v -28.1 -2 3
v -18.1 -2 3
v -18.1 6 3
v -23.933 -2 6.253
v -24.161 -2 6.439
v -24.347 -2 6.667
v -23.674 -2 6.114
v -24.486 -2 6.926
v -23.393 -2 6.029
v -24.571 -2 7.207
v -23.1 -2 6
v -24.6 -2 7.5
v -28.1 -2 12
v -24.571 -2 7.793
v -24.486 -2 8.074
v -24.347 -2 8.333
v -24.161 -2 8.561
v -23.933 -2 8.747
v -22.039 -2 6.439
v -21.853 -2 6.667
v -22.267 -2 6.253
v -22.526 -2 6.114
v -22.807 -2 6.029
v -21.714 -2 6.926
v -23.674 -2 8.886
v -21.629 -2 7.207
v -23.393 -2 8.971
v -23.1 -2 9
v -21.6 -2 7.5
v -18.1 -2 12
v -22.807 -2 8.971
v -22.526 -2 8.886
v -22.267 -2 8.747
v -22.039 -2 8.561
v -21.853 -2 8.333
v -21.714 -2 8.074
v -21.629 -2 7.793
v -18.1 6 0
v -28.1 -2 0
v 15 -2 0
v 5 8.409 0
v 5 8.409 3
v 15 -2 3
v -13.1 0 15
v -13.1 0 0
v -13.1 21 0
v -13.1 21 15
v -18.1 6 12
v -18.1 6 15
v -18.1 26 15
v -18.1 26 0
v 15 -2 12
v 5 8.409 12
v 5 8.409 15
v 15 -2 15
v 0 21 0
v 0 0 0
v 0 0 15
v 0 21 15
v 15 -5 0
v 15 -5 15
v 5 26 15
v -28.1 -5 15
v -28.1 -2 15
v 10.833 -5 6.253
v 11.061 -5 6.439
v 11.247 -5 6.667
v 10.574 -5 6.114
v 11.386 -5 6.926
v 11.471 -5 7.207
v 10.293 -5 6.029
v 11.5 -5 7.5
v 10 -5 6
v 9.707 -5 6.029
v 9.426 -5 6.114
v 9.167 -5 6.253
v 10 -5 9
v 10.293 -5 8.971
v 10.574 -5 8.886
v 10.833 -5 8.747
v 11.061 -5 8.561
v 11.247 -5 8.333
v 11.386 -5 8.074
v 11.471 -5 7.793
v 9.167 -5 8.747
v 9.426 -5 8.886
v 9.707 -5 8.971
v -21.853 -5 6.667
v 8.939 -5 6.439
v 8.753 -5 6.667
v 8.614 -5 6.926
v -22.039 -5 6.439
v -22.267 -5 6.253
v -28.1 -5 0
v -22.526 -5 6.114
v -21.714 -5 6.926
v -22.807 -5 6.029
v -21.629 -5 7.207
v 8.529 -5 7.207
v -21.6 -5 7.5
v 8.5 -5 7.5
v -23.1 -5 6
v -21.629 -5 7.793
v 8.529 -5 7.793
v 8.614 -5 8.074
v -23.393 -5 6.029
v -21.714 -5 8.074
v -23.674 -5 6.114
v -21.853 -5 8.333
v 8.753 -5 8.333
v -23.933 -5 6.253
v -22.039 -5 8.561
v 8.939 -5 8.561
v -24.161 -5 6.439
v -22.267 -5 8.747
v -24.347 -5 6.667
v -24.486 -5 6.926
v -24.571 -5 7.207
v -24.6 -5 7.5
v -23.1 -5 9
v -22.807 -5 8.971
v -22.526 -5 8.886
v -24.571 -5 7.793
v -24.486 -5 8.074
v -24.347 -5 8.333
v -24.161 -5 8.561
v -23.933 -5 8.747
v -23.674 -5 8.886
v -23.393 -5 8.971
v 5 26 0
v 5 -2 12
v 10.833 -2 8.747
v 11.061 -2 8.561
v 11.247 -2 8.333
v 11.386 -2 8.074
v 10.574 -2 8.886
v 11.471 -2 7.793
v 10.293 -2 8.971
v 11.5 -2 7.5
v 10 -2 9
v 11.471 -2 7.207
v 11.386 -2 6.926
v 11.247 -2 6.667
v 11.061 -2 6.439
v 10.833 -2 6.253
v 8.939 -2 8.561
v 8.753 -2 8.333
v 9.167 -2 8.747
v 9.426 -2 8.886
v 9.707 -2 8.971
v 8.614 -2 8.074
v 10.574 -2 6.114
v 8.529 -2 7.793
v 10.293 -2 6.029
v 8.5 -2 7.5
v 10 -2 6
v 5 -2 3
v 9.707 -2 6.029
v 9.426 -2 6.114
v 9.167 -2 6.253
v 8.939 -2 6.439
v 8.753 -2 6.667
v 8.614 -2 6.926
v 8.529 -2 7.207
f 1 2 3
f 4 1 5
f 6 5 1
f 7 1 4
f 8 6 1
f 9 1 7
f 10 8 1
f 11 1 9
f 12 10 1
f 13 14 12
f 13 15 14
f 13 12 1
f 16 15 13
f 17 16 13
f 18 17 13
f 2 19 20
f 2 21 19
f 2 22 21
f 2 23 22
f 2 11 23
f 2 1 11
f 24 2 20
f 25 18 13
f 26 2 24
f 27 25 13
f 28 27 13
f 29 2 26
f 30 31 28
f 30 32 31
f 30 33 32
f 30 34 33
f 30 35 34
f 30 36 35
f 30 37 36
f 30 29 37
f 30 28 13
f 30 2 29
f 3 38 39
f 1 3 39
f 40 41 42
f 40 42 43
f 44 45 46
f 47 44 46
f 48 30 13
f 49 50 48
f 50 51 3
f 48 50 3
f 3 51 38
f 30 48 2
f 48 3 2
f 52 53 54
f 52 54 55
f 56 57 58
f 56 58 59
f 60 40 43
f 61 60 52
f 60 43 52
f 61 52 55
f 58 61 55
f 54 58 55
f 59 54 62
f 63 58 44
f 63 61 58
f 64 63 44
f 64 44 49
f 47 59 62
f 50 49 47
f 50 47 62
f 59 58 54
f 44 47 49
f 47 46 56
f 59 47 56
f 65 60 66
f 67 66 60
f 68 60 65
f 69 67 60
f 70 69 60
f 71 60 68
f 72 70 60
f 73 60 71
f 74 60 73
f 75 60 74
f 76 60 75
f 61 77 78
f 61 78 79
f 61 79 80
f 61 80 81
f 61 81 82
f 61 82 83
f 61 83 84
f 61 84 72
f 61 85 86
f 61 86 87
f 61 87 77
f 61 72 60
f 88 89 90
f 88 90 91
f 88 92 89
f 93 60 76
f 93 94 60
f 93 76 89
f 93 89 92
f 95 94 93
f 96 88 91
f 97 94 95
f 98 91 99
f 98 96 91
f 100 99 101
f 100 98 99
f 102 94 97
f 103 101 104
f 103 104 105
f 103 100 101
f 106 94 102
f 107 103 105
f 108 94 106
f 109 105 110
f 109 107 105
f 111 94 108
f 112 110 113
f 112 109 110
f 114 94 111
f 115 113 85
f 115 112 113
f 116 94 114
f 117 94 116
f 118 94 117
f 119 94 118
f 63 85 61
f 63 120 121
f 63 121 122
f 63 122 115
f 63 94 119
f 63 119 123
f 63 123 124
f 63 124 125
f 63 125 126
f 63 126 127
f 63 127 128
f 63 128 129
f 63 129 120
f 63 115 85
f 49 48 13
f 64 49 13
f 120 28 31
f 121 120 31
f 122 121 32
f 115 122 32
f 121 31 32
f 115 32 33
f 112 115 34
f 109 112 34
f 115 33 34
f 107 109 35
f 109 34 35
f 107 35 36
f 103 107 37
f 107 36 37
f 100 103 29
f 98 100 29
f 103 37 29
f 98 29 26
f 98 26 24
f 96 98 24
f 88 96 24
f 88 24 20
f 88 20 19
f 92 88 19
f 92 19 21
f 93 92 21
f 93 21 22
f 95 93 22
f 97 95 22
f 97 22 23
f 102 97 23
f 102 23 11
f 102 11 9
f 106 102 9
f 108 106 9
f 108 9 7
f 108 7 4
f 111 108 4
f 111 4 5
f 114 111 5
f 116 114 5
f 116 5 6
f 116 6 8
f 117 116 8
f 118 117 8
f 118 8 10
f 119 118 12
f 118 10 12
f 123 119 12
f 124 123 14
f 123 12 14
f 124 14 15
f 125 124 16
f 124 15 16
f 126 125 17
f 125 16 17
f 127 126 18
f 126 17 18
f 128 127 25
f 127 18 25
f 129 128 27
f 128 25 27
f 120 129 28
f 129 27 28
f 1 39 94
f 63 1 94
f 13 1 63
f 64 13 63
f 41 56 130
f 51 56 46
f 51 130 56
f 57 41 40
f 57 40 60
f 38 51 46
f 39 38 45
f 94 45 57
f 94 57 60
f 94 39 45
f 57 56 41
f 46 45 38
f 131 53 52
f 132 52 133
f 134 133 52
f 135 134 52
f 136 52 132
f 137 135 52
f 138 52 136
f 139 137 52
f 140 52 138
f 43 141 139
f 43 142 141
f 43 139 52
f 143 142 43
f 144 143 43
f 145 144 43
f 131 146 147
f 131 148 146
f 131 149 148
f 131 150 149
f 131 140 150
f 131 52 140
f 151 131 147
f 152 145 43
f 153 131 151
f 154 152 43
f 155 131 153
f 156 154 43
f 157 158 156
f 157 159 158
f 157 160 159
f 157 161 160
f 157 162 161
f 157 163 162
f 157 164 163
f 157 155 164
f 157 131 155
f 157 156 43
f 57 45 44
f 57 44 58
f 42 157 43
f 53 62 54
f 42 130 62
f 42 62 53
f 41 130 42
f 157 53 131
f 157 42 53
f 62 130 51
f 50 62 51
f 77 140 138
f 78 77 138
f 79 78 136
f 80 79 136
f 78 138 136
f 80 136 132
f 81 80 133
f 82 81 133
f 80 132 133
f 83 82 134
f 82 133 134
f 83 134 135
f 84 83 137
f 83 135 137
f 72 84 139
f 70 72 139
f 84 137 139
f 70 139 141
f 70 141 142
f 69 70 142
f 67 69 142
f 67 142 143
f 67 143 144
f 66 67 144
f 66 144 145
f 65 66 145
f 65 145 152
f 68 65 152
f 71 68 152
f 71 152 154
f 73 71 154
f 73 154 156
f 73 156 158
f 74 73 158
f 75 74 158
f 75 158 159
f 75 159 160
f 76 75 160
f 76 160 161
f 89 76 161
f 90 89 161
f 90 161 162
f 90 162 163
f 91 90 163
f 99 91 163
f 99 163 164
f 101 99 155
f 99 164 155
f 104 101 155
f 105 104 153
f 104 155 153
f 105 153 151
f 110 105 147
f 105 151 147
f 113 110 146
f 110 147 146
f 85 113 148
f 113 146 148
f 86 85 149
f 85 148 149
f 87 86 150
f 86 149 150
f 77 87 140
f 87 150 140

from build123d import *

# Parameters (mm, degrees)
ESBO_O1_W                = 13.1
ESBO_O1_H                = 21
RESSALTO_EXTRUS_O1_DEPTH = 15
ESBO_O2_W                = 15
ESBO_O2_H                = 3
RESSALTO_EXTRUS_O2_DEPTH = 10
ESBO_O3_W                = 3
ESBO_O3_H                = 8
RESSALTO_EXTRUS_O3_DEPTH = 10
CORTE_EXTRUS_O1_DEPTH    = 19
ESBO_O5_R                = 1.5
CORTE_EXTRUS_O2_DEPTH    = 19
RESSALTO_EXTRUS_O4_DEPTH = 10
CORTE_EXTRUS_O3_DEPTH    = 23
ESBO_O8_R                = 1.5
CORTE_EXTRUS_O4_DEPTH    = 23


with BuildPart() as part:
    # Esboço1 → Ressalto-extrusão1 (new body)
    with BuildSketch(Plane.XY):
        Polygon((0, 26), (5, 26), (5, -5), (-18.1, -5), (-18.1, 0), (-18.1, 26), align=None)
        with Locations((-6.55, 10.5)):
            Rectangle(ESBO_O1_W, ESBO_O1_H, mode=Mode.SUBTRACT)
    extrude(amount=RESSALTO_EXTRUS_O1_DEPTH)

    # Esboço2 → Ressalto-extrusão2 (add)
    with BuildSketch(Plane.ZY.offset(18.1)):
        with Locations((7.5, -3.5)):
            Rectangle(ESBO_O2_W, ESBO_O2_H)
    extrude(amount=RESSALTO_EXTRUS_O2_DEPTH)

    # Esboço3 → Ressalto-extrusão3 (add)
    with BuildSketch(Plane.ZY.offset(18.1)):
        with Locations((1.5, 2)):
            Rectangle(ESBO_O3_W, ESBO_O3_H)
        with Locations((13.5, 2)):
            Rectangle(ESBO_O3_W, ESBO_O3_H)
    extrude(amount=RESSALTO_EXTRUS_O3_DEPTH)

    # Esboço4 → Corte-extrusão1 (cut)
    with BuildSketch(Plane(origin=(0, 0, 0), x_dir=(-1, 0, 0), z_dir=(0, 0, -1))):
        Polygon((18.1, 6), (28.1, -2), (28.1, 6), align=None)
    extrude(amount=-CORTE_EXTRUS_O1_DEPTH, mode=Mode.SUBTRACT)

    # Esboço5 → Corte-extrusão2 (cut)
    with BuildSketch(Plane(origin=(0, -2, 0), x_dir=(1, 0, 0), z_dir=(0, 1, 0))):
        with Locations(Location((-23.1, -7.5, 0), (0, 0, 270))):
            Circle(ESBO_O5_R)
    extrude(amount=-CORTE_EXTRUS_O2_DEPTH, mode=Mode.SUBTRACT)

    # Esboço6 → Ressalto-extrusão4 (add)
    with BuildSketch(Plane(origin=(5, 0, 0), x_dir=(0, 0, -1), z_dir=(1, 0, 0))):
        Polygon((-15, -5), (-15, 8.409277905), (-12, 8.409277905), (-12, -2), (-3, -2), (-3, 8.409277905), (0, 8.409277905), (0, -5), align=None)
    extrude(amount=RESSALTO_EXTRUS_O4_DEPTH)

    # Esboço7 → Corte-extrusão3 (cut)
    with BuildSketch(Plane(origin=(0, 0, 0), x_dir=(-1, 0, 0), z_dir=(0, 0, -1))):
        Polygon((-5, 8.409277905), (-15, -2), (-15, 8.409277905), align=None)
    extrude(amount=-CORTE_EXTRUS_O3_DEPTH, mode=Mode.SUBTRACT)

    # Esboço8 → Corte-extrusão4 (cut)
    with BuildSketch(Plane(origin=(0, -2, 0), x_dir=(1, 0, 0), z_dir=(0, 1, 0))):
        with Locations(Location((10, -7.5, 0), (0, 0, 270))):
            Circle(ESBO_O8_R)
    extrude(amount=-CORTE_EXTRUS_O4_DEPTH, mode=Mode.SUBTRACT)


solid = part.part
